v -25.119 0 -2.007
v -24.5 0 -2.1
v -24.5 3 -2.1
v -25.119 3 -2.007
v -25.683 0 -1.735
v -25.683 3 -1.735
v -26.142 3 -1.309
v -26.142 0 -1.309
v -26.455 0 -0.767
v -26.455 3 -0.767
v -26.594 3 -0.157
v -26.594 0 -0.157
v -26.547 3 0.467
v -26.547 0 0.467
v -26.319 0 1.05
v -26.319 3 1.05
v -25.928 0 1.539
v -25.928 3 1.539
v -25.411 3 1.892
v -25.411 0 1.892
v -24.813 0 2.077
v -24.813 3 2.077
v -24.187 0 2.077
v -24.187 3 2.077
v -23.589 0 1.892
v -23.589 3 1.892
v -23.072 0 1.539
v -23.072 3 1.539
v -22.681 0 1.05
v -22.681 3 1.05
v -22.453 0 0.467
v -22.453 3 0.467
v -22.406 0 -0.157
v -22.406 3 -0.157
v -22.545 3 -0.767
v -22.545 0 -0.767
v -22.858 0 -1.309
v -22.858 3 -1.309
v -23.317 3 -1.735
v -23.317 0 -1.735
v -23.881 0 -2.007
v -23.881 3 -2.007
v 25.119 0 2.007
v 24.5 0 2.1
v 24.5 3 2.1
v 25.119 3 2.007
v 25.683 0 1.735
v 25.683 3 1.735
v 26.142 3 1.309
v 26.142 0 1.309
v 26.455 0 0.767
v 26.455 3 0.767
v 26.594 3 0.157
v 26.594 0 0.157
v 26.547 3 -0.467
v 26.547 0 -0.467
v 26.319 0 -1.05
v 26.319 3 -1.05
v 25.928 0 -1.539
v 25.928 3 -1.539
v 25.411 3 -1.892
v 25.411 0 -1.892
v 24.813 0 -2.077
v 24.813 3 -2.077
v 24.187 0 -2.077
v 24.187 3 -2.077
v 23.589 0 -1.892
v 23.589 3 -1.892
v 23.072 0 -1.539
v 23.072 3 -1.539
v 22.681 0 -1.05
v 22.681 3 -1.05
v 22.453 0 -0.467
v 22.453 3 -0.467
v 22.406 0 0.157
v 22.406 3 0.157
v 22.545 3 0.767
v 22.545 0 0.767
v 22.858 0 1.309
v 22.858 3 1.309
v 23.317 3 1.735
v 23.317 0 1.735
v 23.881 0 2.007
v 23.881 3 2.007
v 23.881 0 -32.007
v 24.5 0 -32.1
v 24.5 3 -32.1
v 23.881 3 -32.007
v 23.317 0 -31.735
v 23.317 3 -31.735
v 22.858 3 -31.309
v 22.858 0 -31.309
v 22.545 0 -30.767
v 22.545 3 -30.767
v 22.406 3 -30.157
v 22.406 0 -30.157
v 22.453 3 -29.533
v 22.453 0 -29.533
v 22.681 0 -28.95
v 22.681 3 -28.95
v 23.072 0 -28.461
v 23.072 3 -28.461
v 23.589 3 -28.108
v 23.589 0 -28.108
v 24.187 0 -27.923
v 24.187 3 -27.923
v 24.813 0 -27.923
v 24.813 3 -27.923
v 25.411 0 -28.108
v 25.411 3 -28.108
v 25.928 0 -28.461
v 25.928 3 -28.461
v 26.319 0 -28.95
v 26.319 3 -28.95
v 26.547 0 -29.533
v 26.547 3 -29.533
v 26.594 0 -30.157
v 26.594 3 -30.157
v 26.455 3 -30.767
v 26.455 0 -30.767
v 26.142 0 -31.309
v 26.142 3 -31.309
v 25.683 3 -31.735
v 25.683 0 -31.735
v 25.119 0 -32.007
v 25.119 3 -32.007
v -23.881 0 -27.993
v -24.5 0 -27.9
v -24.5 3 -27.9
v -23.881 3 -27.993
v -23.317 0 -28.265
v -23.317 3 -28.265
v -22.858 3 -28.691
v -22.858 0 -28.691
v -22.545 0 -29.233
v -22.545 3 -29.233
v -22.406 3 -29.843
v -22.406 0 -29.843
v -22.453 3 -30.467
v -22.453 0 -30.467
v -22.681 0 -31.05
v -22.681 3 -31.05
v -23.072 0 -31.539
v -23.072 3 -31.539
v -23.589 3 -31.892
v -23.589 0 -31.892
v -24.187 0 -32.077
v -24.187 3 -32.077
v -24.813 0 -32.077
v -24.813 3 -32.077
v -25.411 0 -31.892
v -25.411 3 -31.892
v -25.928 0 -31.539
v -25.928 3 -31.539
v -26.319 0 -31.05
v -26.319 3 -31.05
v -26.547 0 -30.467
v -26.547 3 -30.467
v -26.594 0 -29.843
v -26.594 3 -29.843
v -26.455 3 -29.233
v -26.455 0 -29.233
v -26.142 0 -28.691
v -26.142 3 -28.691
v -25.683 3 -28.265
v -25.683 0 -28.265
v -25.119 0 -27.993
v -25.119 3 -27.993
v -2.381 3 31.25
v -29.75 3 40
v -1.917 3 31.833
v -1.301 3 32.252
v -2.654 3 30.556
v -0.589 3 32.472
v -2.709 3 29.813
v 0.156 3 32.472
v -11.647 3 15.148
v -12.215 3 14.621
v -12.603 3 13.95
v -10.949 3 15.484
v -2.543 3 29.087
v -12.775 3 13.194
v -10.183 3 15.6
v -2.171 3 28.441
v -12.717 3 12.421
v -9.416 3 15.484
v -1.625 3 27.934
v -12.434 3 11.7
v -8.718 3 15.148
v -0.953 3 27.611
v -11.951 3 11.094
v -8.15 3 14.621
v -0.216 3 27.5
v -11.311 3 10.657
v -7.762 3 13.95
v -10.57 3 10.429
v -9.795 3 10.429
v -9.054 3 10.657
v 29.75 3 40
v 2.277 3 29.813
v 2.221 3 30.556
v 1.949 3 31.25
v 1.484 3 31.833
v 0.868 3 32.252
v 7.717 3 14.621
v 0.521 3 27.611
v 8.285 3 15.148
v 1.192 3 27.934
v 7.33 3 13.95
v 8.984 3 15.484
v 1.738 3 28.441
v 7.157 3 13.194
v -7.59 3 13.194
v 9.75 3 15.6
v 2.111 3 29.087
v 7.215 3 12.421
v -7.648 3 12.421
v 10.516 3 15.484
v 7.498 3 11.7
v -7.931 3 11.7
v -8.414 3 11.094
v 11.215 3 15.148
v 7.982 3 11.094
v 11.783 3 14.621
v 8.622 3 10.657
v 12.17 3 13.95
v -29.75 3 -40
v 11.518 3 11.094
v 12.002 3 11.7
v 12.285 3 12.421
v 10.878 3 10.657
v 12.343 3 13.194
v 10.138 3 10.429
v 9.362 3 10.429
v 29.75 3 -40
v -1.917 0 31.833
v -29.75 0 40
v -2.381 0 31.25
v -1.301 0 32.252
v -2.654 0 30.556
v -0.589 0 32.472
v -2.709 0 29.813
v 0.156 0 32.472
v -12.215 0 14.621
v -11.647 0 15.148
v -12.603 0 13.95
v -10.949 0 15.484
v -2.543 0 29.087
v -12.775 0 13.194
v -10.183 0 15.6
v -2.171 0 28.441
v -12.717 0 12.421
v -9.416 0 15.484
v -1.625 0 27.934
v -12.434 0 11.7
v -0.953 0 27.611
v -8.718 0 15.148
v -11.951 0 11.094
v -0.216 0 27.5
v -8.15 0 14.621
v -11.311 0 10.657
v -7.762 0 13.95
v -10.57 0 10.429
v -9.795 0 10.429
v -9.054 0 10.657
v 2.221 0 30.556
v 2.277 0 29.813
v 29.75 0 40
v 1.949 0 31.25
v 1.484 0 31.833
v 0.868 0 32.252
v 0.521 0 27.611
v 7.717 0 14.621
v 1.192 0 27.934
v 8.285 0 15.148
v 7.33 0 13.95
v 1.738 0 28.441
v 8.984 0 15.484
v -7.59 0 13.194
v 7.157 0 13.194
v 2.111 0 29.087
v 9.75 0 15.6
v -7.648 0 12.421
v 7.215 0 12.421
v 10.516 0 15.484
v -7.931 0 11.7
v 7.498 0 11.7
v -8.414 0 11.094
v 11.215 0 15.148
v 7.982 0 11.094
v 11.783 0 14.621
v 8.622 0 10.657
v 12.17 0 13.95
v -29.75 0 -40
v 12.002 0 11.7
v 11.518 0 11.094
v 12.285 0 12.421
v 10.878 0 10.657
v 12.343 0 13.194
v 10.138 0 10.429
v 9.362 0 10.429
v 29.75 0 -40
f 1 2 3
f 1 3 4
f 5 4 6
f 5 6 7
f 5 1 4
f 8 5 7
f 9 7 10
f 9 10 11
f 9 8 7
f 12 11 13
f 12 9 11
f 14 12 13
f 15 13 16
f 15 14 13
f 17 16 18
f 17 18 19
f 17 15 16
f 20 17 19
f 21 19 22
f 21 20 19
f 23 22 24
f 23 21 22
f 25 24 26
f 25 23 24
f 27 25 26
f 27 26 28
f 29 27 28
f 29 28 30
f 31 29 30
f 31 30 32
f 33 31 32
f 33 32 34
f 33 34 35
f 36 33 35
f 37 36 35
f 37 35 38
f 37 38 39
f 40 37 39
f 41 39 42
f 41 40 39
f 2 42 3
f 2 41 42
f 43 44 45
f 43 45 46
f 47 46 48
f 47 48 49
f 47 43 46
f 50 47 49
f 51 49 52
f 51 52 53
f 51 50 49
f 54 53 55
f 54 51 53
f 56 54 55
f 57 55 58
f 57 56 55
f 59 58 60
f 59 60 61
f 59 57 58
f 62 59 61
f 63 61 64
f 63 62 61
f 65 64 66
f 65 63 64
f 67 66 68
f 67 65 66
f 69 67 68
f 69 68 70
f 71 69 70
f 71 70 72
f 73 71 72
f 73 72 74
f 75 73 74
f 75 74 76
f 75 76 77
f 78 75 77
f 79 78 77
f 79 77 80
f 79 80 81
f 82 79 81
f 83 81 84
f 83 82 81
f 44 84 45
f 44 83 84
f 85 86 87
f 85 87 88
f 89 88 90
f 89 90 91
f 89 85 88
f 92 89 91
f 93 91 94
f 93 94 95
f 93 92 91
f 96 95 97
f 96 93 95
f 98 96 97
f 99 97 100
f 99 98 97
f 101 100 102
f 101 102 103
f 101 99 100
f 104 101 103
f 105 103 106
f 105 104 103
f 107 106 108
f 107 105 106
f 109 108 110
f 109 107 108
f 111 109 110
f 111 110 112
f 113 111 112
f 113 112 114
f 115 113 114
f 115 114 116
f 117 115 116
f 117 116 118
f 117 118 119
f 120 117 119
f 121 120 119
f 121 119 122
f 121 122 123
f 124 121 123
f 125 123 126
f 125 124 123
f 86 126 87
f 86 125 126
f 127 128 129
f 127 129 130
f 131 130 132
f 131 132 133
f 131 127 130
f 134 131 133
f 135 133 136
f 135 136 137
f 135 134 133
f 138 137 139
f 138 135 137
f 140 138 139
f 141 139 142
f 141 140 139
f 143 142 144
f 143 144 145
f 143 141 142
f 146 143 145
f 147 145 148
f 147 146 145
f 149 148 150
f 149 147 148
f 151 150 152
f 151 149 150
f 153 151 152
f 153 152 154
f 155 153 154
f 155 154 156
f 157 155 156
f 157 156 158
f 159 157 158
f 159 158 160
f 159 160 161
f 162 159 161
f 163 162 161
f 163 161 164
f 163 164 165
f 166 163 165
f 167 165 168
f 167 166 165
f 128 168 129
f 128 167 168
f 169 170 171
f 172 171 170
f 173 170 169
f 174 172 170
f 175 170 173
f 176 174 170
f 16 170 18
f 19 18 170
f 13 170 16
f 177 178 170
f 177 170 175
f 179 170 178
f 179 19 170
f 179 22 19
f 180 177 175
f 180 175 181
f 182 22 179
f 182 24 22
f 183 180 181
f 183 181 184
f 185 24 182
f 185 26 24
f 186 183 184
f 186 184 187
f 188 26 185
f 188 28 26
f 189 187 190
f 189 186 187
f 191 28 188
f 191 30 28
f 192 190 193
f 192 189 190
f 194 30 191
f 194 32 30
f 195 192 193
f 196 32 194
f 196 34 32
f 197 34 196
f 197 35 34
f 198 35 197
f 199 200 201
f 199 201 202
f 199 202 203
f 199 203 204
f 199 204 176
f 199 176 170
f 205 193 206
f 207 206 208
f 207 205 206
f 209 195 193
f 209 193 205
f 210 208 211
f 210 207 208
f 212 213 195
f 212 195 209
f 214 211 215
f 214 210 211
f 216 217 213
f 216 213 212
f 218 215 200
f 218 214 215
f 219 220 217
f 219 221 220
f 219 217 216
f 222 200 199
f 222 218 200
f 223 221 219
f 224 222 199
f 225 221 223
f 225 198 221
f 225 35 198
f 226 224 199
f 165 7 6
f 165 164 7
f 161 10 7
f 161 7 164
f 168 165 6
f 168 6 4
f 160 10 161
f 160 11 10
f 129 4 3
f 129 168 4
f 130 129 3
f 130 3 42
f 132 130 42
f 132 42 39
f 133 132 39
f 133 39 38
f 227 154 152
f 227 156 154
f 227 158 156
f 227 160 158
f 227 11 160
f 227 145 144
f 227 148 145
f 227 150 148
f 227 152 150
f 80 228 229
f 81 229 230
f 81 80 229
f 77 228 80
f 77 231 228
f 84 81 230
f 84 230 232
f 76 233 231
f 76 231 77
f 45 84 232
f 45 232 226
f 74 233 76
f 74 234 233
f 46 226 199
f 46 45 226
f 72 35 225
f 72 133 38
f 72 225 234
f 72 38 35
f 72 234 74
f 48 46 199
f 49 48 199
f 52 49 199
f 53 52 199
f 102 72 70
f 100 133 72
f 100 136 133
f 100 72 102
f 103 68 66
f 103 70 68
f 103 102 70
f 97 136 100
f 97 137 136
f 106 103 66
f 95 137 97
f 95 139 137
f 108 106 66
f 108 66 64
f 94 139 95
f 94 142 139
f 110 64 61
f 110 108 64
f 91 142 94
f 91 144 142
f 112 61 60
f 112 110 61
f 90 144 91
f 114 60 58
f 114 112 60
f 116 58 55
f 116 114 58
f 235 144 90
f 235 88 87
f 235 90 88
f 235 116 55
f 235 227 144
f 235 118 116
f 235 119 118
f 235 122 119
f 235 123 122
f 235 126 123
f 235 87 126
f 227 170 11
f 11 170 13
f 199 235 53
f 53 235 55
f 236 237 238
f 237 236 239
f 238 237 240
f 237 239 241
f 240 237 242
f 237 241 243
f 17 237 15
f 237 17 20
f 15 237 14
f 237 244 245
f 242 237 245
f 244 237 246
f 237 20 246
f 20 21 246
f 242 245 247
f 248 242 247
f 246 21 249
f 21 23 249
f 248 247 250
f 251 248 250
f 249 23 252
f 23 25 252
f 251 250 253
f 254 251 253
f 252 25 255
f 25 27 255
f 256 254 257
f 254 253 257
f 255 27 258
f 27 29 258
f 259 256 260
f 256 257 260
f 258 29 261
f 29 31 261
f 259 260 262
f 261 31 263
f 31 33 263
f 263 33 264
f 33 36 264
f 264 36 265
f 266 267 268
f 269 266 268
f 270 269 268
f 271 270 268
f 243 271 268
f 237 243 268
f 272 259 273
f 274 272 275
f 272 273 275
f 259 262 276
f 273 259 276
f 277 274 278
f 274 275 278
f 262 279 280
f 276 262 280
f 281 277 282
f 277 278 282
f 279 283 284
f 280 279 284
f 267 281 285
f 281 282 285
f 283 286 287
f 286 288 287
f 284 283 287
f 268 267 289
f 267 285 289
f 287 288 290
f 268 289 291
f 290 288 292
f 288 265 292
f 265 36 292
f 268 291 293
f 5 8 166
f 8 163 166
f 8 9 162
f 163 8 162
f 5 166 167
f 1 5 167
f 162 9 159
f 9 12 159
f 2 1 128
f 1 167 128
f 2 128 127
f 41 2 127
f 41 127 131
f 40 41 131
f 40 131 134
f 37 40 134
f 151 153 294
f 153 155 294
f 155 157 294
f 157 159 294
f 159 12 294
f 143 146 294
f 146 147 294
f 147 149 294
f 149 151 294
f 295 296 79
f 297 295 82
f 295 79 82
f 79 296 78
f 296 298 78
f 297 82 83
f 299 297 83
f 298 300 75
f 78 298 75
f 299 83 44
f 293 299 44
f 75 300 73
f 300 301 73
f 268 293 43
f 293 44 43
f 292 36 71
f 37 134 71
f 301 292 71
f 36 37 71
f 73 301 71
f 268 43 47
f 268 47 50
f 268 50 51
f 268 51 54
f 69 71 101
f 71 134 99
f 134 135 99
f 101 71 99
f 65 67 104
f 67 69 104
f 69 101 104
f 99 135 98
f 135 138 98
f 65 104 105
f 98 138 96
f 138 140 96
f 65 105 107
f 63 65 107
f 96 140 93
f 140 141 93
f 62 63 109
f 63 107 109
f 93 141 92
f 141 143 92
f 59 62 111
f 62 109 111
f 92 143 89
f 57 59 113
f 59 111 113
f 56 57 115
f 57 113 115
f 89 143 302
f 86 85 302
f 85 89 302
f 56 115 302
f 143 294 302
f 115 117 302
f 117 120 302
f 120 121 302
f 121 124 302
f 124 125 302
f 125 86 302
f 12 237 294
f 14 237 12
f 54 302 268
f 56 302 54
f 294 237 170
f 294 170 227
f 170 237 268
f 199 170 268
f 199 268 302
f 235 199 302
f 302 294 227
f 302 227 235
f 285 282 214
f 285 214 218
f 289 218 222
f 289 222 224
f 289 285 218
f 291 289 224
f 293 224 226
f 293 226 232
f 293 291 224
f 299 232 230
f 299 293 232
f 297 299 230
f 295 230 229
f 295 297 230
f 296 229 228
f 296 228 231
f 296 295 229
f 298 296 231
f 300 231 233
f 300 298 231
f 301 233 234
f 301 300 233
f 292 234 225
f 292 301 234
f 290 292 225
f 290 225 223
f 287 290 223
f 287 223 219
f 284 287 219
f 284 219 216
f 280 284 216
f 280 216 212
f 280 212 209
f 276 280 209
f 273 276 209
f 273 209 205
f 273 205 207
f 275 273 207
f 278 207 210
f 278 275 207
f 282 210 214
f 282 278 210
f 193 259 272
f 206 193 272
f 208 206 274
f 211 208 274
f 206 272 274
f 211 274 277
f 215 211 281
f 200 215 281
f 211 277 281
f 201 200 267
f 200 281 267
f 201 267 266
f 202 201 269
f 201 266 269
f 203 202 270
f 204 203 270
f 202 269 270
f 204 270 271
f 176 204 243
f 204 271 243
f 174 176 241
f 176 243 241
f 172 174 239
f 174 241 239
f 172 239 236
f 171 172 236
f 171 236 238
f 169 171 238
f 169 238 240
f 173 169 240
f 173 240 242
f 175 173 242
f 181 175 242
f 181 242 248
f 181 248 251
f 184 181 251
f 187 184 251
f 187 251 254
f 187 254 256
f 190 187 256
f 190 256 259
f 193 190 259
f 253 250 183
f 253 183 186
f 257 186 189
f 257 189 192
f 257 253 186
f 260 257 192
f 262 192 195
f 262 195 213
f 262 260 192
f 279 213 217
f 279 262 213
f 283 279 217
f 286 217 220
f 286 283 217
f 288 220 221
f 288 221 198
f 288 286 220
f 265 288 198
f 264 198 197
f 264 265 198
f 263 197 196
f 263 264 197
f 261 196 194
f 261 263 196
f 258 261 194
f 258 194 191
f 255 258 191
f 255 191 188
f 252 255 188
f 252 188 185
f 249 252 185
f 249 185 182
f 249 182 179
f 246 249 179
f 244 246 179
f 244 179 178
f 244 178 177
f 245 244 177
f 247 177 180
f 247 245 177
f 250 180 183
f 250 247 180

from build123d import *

# Parameters (mm, degrees)
SKETCH1_W           = 59.5
SKETCH1_H           = 80
SKETCH1_R           = 2.1
SKETCH1_R_2         = 2.6
BOSS_EXTRUDE1_DEPTH = 3
SKETCH2_R           = 2.5
CUT_EXTRUDE1_DEPTH  = 10


with BuildPart() as part:
    # Sketch1 → Boss-Extrude1 (new body)
    with BuildSketch(Plane(origin=(0, 0, 0), x_dir=(1, 0, 0), z_dir=(0, 1, 0))):
        Rectangle(SKETCH1_W, SKETCH1_H)
        with Locations(Location((24.5, 30, 0), (0, 0, 90))):
            Circle(SKETCH1_R, mode=Mode.SUBTRACT)
        with Locations(Location((-24.5, 30, 0), (0, 0, 270))):
            Circle(SKETCH1_R, mode=Mode.SUBTRACT)
        with Locations(Location((-24.5, 0, 0), (0, 0, 90))):
            Circle(SKETCH1_R, mode=Mode.SUBTRACT)
        with Locations(Location((24.5, 0, 0), (0, 0, 270))):
            Circle(SKETCH1_R, mode=Mode.SUBTRACT)
        with Locations(Location((9.75, -13, 0), (0, 0, 270))):
            Circle(SKETCH1_R_2, mode=Mode.SUBTRACT)
        with Locations(Location((-10.182503526, -13, 0), (0, 0, 270))):
            Circle(SKETCH1_R_2, mode=Mode.SUBTRACT)
    extrude(amount=BOSS_EXTRUDE1_DEPTH)

    # Sketch2 → Cut-Extrude1 (cut)
    with BuildSketch(Plane.XZ):
        with Locations(Location((-0.216251763, 30, 0), (0, 0, 270))):
            Circle(SKETCH2_R)
    extrude(amount=-CUT_EXTRUDE1_DEPTH, mode=Mode.SUBTRACT)


solid = part.part
